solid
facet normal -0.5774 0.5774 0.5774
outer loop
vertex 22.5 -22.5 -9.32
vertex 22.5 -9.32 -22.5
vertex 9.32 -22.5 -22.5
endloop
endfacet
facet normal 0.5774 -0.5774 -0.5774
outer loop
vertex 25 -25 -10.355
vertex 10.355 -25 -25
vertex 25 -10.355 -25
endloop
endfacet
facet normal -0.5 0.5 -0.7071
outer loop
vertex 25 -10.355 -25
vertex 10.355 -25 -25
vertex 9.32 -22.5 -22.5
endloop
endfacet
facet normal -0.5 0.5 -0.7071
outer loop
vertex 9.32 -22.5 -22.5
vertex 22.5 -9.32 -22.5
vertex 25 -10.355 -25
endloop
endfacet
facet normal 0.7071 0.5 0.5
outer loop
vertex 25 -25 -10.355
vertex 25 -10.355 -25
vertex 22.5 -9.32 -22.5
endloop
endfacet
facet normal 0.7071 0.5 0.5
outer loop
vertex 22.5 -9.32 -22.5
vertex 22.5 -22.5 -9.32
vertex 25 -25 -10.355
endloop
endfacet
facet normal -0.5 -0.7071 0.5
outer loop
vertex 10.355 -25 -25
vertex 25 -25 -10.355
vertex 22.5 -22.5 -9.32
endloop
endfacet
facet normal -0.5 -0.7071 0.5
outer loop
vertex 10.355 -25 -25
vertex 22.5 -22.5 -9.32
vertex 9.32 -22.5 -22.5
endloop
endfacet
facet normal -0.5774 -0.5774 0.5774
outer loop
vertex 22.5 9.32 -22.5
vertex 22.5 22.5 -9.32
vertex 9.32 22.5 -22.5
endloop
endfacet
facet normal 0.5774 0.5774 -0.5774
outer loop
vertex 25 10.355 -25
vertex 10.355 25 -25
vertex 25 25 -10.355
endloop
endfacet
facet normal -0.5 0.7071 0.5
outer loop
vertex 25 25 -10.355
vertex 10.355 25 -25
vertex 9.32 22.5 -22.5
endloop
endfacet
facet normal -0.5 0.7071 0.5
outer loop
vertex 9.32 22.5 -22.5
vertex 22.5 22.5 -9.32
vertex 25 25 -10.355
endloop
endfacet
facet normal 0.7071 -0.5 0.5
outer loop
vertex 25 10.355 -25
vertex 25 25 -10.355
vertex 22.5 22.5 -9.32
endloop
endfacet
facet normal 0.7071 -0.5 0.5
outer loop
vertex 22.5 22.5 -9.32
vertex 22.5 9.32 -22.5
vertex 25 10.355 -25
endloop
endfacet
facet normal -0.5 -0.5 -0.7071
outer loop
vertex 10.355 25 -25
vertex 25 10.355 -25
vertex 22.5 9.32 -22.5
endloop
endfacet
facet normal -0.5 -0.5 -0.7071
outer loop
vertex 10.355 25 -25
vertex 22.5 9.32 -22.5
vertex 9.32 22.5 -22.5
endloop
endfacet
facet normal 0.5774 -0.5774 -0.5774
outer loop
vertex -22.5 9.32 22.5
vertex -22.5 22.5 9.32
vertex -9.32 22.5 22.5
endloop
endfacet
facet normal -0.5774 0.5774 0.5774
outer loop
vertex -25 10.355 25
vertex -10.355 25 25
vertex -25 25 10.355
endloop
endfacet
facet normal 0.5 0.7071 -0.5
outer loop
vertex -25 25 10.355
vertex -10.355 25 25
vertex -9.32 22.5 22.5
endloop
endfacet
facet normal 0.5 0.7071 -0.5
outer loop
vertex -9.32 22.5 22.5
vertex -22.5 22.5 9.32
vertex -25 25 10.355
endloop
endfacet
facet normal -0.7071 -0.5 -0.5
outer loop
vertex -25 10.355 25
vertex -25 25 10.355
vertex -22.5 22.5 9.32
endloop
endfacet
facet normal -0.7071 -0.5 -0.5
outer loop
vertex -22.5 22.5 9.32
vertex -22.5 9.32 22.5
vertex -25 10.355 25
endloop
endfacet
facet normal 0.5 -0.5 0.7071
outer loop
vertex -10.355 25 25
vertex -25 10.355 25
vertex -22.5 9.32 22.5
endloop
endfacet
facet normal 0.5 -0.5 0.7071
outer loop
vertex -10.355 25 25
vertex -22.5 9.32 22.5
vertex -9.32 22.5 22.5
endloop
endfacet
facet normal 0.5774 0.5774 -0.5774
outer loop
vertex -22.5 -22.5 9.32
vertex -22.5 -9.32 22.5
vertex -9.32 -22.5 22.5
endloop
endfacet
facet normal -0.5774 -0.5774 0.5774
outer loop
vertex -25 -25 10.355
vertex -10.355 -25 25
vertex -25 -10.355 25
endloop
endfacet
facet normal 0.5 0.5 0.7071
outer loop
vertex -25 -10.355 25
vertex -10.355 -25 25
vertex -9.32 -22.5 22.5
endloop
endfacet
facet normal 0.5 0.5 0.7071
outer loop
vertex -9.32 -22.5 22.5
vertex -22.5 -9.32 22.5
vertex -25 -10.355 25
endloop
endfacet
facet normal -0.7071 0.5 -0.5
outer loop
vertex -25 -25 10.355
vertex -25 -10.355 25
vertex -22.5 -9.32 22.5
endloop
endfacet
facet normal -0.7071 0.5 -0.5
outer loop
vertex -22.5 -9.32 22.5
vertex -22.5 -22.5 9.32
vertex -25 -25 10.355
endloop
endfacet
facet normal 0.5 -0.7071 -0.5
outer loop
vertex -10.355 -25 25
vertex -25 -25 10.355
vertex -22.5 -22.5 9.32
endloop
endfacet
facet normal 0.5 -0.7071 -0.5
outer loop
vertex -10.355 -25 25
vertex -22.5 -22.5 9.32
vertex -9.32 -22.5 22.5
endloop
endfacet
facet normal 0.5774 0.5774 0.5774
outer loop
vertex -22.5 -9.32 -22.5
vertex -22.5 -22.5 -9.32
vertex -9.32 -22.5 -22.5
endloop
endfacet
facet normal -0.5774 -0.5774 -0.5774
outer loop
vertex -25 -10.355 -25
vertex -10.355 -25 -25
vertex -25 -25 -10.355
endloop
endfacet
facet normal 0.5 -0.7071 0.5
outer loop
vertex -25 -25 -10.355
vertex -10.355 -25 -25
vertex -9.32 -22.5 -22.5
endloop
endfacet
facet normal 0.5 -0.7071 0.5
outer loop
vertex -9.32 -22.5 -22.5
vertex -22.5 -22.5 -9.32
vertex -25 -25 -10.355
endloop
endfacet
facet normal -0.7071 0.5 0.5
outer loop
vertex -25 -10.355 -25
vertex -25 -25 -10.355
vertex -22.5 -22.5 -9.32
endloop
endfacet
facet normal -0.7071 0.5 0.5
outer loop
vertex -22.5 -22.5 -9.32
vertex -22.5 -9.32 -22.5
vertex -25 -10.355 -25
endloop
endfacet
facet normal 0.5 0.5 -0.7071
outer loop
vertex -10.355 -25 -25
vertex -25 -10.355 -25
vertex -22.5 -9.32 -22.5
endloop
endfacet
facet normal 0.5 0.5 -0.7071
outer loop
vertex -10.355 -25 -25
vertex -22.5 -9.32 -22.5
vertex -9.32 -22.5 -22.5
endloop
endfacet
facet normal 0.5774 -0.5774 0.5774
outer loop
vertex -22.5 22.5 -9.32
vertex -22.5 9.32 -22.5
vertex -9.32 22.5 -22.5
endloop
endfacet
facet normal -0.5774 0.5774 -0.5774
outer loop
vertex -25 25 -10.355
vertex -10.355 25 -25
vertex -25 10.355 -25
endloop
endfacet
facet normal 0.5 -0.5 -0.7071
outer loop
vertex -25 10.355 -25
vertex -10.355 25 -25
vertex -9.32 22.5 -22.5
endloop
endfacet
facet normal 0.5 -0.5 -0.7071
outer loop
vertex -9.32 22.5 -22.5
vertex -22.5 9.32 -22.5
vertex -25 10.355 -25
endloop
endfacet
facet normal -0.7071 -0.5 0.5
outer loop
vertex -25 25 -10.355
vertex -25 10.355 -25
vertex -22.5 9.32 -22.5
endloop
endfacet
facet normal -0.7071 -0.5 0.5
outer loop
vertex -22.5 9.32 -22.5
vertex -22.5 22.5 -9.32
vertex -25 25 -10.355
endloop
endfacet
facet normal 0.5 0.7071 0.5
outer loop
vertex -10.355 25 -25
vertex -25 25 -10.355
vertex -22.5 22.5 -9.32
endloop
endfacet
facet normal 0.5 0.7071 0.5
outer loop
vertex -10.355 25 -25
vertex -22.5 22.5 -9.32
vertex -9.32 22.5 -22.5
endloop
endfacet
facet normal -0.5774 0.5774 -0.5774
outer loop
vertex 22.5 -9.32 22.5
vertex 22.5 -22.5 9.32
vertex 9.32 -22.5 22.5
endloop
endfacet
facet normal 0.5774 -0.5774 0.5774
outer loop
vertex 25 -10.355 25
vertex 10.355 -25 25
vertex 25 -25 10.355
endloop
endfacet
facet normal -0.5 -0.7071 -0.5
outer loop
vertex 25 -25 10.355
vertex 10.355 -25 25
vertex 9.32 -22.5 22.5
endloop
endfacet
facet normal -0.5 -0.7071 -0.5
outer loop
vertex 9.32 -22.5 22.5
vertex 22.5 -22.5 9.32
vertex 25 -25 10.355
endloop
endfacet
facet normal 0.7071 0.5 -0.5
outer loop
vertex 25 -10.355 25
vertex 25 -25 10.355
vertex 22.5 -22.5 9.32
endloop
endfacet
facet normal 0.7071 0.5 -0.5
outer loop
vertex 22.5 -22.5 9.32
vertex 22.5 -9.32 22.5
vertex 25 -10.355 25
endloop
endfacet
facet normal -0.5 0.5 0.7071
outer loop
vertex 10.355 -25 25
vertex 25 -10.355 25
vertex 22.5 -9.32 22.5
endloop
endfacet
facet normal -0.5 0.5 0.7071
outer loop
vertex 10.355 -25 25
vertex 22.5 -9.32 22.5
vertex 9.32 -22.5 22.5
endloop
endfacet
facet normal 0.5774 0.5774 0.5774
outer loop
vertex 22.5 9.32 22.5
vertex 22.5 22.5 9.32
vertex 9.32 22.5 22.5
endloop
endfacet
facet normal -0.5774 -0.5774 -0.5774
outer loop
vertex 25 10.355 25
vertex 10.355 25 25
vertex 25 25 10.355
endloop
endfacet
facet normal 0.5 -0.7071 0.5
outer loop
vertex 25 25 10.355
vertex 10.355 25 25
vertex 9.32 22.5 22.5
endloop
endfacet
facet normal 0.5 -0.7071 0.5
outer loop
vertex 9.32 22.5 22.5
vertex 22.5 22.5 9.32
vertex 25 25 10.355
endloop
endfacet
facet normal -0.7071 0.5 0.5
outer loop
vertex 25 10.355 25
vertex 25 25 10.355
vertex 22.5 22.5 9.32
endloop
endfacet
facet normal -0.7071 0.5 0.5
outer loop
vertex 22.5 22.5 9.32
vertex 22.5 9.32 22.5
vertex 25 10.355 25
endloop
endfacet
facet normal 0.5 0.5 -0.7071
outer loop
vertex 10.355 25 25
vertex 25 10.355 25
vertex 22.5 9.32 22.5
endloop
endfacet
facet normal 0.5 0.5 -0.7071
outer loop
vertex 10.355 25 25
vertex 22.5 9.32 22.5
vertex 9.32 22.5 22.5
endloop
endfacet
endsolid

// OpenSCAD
/*
   truncated cube
     coordinates from Wolfram/alpha
     triangles by pmoews  triangular faces
*/
polyhedron
       (points = [
                 [  10.35534,  25.00000,  25.00000],
                 [  10.35534,  25.00000, -25.00000],
                 [  10.35534, -25.00000,  25.00000],
                 [  10.35534, -25.00000, -25.00000],
                 [ -10.35534,  25.00000,  25.00000],
                 [ -10.35534,  25.00000, -25.00000],
                 [ -10.35534, -25.00000,  25.00000],
                 [ -10.35534, -25.00000, -25.00000],
                 [  25.00000,  10.35534,  25.00000],
                 [  25.00000,  10.35534, -25.00000],
                 [  25.00000, -10.35534,  25.00000],
                 [  25.00000, -10.35534, -25.00000],
                 [ -25.00000,  10.35534,  25.00000],
                 [ -25.00000,  10.35534, -25.00000],
                 [ -25.00000, -10.35534,  25.00000],
                 [ -25.00000, -10.35534, -25.00000],
                 [  25.00000,  25.00000,  10.35534],
                 [  25.00000,  25.00000, -10.35534],
                 [  25.00000, -25.00000,  10.35534],
                 [  25.00000, -25.00000, -10.35534],
                 [ -25.00000,  25.00000,  10.35534],
                 [ -25.00000,  25.00000, -10.35534],
                 [ -25.00000, -25.00000,  10.35534],
                 [ -25.00000, -25.00000, -10.35534],
                 [   9.31980,  22.50000,  22.50000],
                 [   9.31980,  22.50000, -22.50000],
                 [   9.31980, -22.50000,  22.50000],
                 [   9.31980, -22.50000, -22.50000],
                 [  -9.31980,  22.50000,  22.50000],
                 [  -9.31980,  22.50000, -22.50000],
                 [  -9.31980, -22.50000,  22.50000],
                 [  -9.31980, -22.50000, -22.50000],
                 [  22.50000,   9.31980,  22.50000],
                 [  22.50000,   9.31980, -22.50000],
                 [  22.50000,  -9.31980,  22.50000],
                 [  22.50000,  -9.31980, -22.50000],
                 [ -22.50000,   9.31980,  22.50000],
                 [ -22.50000,   9.31980, -22.50000],
                 [ -22.50000,  -9.31980,  22.50000],
                 [ -22.50000,  -9.31980, -22.50000],
                 [  22.50000,  22.50000,   9.31980],
                 [  22.50000,  22.50000,  -9.31980],
                 [  22.50000, -22.50000,   9.31980],
                 [  22.50000, -22.50000,  -9.31980],
                 [ -22.50000,  22.50000,   9.31980],
                 [ -22.50000,  22.50000,  -9.31980],
                 [ -22.50000, -22.50000,   9.31980],
                 [ -22.50000, -22.50000,  -9.31980],
                ],
           triangles = [
                 [   27,   35,   43],[   11,    3,   19],
                 [   27,    3,   11],[   11,   35,   27],
                 [   35,   11,   19],[   19,   43,   35],
                 [   43,   19,    3],[   27,   43,    3],
                 [   25,   41,   33],[   17,    1,    9],
                 [   25,    1,   17],[   17,   41,   25],
                 [   41,   17,    9],[    9,   33,   41],
                 [   33,    9,    1],[   25,   33,    1],
                 [   28,   44,   36],[   20,    4,   12],
                 [   28,    4,   20],[   20,   44,   28],
                 [   44,   20,   12],[   12,   36,   44],
                 [   36,   12,    4],[   28,   36,    4],
                 [   30,   38,   46],[   14,    6,   22],
                 [   30,    6,   14],[   14,   38,   30],
                 [   38,   14,   22],[   22,   46,   38],
                 [   46,   22,    6],[   30,   46,    6],
                 [   31,   47,   39],[   23,    7,   15],
                 [   31,    7,   23],[   23,   47,   31],
                 [   47,   23,   15],[   15,   39,   47],
                 [   39,   15,    7],[   31,   39,    7],
                 [   29,   37,   45],[   13,    5,   21],
                 [   29,    5,   13],[   13,   37,   29],
                 [   37,   13,   21],[   21,   45,   37],
                 [   45,   21,    5],[   29,   45,    5],
                 [   26,   42,   34],[   18,    2,   10],
                 [   26,    2,   18],[   18,   42,   26],
                 [   42,   18,   10],[   10,   34,   42],
                 [   34,   10,    2],[   26,   34,    2],
                 [   24,   40,   32],[   16,    0,    8],
                 [   24,    0,   16],[   16,   40,   24],
                 [   40,   16,    8],[    8,   32,   40],
                 [   32,    8,    0],[   24,   32,    0],
                 ]
      );
